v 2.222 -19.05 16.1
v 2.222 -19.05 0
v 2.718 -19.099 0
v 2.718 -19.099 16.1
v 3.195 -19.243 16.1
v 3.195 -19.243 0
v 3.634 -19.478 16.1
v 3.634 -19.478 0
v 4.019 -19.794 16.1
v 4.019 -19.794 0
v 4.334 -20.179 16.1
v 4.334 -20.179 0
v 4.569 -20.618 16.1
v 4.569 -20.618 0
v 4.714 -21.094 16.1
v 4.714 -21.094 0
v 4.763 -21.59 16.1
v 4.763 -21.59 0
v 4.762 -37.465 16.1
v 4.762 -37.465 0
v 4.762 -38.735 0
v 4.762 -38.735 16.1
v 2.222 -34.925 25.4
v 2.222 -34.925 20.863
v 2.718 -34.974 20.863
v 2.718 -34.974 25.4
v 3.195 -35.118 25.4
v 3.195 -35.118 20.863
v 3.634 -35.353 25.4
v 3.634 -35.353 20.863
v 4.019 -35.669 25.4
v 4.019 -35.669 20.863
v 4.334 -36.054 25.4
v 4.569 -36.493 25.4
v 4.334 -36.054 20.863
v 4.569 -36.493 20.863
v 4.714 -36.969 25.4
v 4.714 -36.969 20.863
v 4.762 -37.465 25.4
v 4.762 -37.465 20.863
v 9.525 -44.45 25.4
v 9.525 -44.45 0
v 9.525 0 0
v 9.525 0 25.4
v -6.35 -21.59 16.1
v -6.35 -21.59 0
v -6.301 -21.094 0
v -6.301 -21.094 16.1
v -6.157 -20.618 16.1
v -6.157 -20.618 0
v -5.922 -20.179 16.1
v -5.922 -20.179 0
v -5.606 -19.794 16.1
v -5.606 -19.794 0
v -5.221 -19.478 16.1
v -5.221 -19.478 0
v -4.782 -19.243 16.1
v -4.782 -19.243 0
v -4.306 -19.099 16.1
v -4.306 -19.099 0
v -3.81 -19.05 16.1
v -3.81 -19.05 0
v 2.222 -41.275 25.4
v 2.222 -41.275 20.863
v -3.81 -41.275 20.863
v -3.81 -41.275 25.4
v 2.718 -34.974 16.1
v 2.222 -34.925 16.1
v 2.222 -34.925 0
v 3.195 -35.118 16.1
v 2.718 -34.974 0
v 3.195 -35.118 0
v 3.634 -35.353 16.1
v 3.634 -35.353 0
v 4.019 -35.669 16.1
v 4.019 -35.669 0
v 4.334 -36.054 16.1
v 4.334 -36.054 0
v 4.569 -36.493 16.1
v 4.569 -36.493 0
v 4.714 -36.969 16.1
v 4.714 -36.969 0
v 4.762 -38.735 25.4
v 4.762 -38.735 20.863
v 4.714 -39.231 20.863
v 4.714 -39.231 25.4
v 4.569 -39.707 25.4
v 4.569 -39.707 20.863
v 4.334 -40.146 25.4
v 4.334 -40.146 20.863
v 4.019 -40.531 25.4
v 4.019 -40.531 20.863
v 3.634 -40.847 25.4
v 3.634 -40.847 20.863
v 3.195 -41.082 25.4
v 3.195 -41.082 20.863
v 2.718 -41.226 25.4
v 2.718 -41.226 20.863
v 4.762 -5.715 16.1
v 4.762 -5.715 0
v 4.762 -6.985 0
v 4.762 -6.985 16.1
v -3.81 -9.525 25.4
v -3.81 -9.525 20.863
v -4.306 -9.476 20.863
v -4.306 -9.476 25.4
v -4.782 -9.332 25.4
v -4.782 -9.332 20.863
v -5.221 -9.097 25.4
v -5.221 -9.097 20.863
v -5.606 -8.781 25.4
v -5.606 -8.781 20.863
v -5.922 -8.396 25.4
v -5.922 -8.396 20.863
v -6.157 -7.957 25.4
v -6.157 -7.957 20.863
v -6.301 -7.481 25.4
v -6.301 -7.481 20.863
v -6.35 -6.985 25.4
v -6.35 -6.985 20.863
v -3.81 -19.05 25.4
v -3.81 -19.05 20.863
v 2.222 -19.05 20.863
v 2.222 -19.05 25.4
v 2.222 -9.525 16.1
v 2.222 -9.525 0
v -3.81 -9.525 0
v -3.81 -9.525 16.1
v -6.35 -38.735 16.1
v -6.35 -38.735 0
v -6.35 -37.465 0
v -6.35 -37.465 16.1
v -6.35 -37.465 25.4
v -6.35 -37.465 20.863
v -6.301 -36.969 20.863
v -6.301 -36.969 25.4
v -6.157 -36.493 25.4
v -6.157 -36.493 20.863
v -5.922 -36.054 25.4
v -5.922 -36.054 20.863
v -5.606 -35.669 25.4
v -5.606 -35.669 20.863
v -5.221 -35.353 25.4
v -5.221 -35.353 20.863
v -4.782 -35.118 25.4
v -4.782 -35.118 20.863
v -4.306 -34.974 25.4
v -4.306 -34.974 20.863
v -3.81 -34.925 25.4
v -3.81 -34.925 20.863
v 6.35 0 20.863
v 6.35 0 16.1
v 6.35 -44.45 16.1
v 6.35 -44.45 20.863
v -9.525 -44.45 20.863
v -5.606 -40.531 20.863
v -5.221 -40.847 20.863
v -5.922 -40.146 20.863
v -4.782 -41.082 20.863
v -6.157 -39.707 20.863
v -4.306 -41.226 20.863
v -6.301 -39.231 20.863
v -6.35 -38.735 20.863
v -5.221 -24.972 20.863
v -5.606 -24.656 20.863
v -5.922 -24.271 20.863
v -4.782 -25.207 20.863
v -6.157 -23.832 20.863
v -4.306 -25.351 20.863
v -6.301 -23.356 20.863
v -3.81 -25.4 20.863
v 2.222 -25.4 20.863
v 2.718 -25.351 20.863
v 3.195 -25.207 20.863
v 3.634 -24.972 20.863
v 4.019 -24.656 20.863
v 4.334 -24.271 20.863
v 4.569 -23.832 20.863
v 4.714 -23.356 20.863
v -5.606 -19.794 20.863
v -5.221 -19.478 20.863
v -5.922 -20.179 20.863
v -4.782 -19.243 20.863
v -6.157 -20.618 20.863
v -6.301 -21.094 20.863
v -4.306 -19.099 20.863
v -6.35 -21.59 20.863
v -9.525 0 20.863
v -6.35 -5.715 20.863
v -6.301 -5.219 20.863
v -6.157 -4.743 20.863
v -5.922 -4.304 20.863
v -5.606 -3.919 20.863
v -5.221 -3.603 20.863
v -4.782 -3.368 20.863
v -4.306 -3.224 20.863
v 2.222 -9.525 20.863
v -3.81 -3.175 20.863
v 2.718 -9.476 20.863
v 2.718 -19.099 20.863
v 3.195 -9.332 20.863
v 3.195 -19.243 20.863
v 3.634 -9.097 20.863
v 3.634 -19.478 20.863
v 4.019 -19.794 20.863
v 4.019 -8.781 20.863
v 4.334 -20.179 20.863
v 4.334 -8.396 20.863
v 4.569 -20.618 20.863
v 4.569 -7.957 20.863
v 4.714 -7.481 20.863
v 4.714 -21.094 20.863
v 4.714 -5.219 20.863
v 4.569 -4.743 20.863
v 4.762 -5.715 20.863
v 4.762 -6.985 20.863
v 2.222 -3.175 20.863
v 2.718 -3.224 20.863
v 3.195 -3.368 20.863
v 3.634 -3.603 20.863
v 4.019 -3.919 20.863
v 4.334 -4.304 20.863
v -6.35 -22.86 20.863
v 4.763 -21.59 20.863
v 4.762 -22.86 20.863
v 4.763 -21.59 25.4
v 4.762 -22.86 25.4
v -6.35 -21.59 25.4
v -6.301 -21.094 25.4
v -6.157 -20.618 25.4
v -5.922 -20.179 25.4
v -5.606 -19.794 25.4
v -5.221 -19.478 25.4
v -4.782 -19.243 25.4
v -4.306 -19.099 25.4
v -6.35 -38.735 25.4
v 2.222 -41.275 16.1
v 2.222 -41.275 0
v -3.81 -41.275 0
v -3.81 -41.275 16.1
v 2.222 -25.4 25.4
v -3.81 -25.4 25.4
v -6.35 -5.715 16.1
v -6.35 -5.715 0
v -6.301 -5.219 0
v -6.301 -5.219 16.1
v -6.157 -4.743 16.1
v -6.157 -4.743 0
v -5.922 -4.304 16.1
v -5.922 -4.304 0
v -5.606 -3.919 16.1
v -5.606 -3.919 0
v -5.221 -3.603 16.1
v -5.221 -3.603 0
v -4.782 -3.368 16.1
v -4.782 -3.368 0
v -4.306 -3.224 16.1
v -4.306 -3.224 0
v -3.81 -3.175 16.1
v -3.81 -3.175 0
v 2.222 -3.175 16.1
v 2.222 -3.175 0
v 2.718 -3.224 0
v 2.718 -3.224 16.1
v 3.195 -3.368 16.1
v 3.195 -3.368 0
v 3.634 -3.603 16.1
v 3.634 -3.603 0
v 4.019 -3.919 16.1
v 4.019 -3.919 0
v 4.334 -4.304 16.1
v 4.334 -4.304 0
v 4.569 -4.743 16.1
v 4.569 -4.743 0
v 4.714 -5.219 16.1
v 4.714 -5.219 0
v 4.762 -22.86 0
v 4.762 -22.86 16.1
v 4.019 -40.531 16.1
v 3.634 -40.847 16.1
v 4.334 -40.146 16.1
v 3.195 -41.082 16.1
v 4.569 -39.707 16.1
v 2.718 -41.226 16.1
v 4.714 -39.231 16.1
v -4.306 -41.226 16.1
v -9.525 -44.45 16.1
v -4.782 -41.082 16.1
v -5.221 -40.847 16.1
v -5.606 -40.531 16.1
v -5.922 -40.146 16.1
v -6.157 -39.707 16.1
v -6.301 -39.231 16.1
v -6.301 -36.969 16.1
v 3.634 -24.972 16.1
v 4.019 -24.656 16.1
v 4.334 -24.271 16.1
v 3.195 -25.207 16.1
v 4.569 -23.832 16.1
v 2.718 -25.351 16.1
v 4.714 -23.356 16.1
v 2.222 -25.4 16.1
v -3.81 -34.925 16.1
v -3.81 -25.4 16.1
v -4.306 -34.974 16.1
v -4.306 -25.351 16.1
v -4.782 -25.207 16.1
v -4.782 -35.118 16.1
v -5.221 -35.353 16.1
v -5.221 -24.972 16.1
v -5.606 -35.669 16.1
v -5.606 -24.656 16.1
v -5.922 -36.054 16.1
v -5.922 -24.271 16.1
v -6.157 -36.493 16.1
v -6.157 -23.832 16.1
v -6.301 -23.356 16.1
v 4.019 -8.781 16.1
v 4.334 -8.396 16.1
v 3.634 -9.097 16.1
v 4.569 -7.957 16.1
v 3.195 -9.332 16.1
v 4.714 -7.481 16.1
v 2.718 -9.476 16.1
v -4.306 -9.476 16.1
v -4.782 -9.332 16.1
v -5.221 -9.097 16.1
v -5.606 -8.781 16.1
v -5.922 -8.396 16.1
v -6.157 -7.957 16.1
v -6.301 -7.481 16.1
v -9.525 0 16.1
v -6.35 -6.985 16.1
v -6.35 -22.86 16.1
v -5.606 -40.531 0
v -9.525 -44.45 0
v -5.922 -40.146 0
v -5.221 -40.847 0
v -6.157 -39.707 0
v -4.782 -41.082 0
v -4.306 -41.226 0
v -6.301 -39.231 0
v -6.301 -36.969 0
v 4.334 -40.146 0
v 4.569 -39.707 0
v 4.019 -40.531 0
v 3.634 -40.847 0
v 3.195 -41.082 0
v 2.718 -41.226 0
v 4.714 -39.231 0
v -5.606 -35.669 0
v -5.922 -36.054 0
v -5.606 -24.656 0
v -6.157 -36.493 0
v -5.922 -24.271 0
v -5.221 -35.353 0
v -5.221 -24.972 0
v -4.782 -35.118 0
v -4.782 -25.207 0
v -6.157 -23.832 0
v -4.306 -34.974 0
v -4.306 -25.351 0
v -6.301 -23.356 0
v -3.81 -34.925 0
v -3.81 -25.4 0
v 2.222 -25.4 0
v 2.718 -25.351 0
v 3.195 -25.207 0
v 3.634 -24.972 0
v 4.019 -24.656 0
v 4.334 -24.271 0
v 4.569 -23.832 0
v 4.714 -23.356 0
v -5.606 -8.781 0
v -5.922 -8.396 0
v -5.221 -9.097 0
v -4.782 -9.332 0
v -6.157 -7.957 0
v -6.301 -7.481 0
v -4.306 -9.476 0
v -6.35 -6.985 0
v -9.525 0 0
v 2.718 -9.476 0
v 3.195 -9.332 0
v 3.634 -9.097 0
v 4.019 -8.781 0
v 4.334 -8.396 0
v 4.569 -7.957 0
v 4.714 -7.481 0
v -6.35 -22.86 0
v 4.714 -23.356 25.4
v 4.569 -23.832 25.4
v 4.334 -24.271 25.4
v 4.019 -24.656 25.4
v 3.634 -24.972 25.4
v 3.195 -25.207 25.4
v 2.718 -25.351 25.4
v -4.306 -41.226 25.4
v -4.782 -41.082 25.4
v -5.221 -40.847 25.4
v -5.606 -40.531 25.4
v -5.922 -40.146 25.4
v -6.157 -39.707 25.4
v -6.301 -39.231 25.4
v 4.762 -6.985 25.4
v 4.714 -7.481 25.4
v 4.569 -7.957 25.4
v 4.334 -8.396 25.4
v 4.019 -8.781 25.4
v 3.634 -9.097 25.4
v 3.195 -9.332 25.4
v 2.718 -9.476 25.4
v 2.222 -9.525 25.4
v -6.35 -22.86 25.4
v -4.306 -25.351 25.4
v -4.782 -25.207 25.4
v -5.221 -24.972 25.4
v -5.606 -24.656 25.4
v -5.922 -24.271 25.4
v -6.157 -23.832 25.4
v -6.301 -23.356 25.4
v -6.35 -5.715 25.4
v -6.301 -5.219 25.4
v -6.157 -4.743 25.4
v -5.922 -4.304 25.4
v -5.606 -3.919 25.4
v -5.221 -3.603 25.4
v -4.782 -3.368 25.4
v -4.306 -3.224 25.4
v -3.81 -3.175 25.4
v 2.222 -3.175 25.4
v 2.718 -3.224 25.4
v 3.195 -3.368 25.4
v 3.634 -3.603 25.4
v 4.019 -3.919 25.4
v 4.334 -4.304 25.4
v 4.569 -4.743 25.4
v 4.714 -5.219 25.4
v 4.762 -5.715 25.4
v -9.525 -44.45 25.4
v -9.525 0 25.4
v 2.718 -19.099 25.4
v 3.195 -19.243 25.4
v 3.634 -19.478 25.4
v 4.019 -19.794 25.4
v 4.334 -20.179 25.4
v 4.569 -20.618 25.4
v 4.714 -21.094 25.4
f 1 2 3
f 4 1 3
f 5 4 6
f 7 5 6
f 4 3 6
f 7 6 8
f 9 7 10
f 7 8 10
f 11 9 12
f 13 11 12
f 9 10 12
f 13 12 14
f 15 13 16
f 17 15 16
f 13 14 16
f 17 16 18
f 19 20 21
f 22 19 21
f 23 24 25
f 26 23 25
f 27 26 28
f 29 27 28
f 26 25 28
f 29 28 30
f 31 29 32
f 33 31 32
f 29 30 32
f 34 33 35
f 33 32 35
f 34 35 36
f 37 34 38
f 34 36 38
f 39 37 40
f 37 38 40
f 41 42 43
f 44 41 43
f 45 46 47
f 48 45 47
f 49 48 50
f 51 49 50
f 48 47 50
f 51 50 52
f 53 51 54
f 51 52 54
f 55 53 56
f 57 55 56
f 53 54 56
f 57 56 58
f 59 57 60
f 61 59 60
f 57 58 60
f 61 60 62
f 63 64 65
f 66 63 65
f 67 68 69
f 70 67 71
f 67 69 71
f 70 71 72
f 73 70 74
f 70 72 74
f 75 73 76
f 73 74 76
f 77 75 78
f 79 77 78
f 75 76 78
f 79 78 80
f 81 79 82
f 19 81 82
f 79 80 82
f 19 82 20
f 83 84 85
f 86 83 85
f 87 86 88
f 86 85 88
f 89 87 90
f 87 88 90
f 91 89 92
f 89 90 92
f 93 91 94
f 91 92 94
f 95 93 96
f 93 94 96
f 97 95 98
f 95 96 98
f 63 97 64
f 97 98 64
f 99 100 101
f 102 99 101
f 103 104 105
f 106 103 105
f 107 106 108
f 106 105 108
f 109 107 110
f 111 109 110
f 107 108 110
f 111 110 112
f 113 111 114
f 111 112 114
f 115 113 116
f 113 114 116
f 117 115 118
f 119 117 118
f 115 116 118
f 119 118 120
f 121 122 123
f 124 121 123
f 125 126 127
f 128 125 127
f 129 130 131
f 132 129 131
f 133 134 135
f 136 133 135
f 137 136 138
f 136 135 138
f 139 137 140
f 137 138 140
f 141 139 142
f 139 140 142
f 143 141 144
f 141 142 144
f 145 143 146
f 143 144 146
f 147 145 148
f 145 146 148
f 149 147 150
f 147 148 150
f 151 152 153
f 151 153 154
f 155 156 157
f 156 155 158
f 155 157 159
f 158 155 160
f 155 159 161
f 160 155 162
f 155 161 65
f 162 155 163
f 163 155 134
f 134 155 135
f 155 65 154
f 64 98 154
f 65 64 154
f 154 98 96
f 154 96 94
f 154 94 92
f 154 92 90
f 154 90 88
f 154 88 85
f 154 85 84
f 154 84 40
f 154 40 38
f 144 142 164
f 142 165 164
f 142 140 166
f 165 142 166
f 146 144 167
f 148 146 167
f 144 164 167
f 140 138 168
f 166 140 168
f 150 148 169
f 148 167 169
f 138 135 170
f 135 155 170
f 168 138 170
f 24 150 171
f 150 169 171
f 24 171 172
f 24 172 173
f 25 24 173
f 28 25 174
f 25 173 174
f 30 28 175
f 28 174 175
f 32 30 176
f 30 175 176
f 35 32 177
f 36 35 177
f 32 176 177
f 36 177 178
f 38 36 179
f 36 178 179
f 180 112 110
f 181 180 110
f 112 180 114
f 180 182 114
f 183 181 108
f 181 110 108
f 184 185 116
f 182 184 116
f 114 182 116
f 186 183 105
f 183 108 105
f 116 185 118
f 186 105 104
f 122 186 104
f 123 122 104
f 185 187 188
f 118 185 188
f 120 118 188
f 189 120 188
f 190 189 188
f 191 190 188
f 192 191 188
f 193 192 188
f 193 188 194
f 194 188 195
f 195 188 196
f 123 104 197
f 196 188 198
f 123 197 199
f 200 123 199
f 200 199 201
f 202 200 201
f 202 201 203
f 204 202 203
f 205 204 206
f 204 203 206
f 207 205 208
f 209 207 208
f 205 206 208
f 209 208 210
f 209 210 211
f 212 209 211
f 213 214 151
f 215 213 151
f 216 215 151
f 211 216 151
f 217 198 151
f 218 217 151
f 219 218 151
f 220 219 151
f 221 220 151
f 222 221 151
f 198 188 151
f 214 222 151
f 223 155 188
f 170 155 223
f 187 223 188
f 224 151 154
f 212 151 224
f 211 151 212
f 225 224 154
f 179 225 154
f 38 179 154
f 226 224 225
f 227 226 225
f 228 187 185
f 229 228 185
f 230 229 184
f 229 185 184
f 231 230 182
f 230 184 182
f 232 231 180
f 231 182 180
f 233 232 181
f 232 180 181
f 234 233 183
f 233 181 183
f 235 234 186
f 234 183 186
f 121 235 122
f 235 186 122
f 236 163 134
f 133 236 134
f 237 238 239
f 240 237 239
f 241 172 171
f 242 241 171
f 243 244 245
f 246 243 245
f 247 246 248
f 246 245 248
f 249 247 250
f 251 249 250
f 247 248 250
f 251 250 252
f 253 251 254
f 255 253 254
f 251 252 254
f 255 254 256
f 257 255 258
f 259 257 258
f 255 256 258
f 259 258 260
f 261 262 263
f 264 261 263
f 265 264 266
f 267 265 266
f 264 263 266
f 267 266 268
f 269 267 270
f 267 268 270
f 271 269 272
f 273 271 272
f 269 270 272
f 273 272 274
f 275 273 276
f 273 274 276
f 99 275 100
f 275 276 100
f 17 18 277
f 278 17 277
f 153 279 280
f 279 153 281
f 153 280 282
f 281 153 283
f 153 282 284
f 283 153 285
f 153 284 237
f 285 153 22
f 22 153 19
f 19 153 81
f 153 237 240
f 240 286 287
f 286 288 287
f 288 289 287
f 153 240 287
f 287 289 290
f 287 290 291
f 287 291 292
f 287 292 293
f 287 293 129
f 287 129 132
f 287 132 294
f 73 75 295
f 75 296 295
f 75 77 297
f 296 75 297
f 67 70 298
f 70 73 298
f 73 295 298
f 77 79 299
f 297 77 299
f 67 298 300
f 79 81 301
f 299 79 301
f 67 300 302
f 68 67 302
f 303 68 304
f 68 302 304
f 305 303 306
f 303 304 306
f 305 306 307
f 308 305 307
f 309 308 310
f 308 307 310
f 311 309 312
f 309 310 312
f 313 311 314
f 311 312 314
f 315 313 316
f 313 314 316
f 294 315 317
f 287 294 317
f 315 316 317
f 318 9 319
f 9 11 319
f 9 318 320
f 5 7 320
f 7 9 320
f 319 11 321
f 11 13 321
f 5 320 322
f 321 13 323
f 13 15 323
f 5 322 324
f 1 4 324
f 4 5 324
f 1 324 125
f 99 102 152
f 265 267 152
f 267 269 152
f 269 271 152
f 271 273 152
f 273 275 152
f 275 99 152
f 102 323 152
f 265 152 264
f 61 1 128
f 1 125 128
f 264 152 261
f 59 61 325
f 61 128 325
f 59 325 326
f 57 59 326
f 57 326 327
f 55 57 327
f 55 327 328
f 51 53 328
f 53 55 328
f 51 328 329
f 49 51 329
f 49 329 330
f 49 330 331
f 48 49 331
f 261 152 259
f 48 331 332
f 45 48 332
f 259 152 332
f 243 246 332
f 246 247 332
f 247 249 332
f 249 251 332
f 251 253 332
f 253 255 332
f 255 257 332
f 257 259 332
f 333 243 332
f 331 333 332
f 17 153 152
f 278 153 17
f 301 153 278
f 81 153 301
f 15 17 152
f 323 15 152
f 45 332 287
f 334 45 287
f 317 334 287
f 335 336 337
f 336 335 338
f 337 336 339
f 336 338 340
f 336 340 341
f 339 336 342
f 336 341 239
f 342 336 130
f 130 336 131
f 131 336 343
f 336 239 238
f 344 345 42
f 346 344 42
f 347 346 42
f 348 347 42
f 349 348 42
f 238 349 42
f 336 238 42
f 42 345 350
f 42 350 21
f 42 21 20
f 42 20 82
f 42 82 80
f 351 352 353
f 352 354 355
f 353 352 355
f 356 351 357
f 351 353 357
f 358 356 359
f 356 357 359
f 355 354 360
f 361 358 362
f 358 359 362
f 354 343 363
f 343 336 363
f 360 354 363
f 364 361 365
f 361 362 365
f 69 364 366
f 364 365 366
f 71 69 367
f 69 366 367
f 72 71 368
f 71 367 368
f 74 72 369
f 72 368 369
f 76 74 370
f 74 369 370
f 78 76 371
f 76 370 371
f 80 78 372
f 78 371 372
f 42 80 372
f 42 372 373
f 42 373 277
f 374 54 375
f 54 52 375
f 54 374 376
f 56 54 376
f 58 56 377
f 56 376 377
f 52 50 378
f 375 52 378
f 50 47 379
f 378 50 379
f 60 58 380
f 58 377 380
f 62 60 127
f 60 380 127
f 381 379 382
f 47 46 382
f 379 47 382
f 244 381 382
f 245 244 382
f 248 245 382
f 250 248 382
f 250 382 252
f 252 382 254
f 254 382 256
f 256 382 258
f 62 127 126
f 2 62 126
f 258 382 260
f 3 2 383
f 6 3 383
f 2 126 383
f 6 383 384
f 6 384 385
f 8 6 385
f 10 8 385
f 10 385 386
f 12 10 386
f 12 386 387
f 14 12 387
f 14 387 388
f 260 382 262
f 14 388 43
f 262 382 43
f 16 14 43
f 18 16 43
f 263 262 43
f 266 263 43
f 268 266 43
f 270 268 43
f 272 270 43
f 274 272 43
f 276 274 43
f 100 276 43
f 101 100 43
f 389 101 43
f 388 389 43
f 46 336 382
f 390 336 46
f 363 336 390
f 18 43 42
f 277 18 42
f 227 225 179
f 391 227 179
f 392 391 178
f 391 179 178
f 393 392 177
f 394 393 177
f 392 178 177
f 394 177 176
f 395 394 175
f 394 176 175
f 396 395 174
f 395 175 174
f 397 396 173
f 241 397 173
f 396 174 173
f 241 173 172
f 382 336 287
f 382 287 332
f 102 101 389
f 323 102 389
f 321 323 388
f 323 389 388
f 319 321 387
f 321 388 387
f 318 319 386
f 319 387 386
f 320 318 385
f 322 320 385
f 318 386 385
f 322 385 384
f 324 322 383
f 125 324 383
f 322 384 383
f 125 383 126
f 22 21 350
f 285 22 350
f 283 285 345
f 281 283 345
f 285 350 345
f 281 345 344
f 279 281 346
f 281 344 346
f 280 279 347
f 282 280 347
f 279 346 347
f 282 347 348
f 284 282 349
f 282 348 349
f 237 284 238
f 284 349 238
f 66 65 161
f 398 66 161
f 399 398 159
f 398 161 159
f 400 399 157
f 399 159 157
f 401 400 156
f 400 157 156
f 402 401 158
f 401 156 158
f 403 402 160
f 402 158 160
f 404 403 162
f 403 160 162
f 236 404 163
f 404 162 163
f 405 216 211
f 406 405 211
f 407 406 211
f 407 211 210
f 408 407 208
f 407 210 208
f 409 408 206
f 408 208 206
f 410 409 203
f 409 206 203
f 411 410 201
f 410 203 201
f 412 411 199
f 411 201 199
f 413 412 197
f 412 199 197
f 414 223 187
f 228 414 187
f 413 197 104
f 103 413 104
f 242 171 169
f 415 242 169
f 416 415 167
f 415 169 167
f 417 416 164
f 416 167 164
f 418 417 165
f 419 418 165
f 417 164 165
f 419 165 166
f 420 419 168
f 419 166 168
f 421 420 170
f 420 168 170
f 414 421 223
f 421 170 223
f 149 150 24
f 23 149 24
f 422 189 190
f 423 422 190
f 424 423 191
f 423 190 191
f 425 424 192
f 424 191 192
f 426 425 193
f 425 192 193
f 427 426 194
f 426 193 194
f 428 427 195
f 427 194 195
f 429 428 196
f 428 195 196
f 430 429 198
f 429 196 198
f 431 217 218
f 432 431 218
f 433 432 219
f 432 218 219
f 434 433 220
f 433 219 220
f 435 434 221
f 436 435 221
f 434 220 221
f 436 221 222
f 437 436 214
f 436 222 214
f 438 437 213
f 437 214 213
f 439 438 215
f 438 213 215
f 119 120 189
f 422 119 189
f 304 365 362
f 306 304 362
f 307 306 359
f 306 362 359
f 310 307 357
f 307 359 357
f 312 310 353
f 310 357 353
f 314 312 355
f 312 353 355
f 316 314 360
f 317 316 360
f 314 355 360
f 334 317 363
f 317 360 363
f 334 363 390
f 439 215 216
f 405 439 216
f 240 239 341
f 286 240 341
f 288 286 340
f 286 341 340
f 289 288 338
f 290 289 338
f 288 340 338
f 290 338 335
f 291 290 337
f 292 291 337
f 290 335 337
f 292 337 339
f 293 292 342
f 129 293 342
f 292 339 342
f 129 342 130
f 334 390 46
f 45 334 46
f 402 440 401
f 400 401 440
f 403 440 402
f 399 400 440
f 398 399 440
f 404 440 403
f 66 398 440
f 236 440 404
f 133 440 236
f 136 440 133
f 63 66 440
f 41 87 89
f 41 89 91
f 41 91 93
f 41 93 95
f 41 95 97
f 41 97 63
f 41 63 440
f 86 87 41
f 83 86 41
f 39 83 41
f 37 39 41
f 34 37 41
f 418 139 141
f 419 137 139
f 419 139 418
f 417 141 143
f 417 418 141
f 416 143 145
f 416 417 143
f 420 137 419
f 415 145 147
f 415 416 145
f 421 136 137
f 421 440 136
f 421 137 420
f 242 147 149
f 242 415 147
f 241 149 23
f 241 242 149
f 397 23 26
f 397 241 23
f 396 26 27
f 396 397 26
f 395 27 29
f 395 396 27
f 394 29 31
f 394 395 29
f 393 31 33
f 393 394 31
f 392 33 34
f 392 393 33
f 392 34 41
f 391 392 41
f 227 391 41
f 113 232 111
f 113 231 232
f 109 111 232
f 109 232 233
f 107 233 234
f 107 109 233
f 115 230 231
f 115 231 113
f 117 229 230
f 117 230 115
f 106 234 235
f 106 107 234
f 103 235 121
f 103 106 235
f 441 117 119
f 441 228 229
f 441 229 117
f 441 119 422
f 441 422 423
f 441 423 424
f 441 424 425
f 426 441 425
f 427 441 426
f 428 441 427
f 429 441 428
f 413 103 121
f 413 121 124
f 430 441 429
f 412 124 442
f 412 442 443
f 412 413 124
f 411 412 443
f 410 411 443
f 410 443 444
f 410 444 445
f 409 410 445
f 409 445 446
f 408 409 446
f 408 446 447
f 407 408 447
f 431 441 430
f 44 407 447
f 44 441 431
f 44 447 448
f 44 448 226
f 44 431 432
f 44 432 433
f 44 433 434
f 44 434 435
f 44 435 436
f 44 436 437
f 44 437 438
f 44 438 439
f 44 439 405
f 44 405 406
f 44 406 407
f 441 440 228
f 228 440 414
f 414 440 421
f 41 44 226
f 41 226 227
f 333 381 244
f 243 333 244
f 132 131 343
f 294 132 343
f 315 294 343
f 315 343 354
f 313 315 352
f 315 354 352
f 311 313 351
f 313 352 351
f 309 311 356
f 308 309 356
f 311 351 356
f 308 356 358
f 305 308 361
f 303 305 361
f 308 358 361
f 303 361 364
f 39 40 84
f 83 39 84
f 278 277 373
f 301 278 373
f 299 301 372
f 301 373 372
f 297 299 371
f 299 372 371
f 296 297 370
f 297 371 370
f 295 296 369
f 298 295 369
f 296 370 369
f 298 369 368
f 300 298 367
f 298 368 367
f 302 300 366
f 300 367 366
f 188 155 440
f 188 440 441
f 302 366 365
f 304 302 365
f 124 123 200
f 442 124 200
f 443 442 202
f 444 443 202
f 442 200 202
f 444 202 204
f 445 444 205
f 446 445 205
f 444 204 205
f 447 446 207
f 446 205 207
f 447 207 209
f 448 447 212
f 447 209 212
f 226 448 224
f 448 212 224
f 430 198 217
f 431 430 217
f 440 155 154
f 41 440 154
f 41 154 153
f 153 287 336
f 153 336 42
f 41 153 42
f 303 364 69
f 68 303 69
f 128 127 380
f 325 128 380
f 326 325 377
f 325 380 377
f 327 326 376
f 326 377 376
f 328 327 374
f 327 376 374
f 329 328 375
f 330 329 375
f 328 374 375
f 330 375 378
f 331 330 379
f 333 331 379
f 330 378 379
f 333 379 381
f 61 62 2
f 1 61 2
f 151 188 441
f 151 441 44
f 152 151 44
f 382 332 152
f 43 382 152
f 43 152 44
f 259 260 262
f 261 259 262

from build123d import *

# Parameters (mm, degrees)
F0_W     = 19.05
F0_H     = 44.45
F1_DEPTH = 25.4
F2_W     = 15.875
F2_H     = 4.7625
F2_W_2   = 9.525
F3_DEPTH = 45.974


with BuildPart() as f1:
    # F0 (on Top) → F1 (new body)
    with BuildSketch(Plane.XY):
        with Locations((0, -22.225)):
            Rectangle(F0_W, F0_H)
        with BuildLine():
            ThreePointArc((-6.35, -37.465), (-5.606051, -35.668949), (-3.81, -34.925))
            Line((-3.81, -34.925), (2.2225, -34.925))
            ThreePointArc((2.2225, -34.925), (4.018551, -35.668949), (4.7625, -37.465))
            Line((4.7625, -37.465), (4.7625, -38.735))
            ThreePointArc((4.7625, -38.735), (4.018551, -40.531051), (2.2225, -41.275))
            Line((2.2225, -41.275), (-3.81, -41.275))
            ThreePointArc((-3.81, -41.275), (-5.606051, -40.531051), (-6.35, -38.735))
            Line((-6.35, -38.735), (-6.35, -37.465))
        make_face(mode=Mode.SUBTRACT)
        with BuildLine():
            ThreePointArc((-6.35, -21.59), (-5.606051, -19.793949), (-3.81, -19.05))
            Line((-3.81, -19.05), (2.2225, -19.05))
            ThreePointArc((2.2225, -19.05), (4.018551, -19.793949), (4.7625, -21.59))
            Line((4.7625, -21.59), (4.7625, -22.86))
            ThreePointArc((4.7625, -22.86), (4.018551, -24.656051), (2.2225, -25.4))
            Line((2.2225, -25.4), (-3.81, -25.4))
            ThreePointArc((-3.81, -25.4), (-5.606051, -24.656051), (-6.35, -22.86))
            Line((-6.35, -22.86), (-6.35, -21.59))
        make_face(mode=Mode.SUBTRACT)
        with BuildLine():
            ThreePointArc((-6.35, -5.715), (-5.606051, -3.918949), (-3.81, -3.175))
            Line((-3.81, -3.175), (2.2225, -3.175))
            ThreePointArc((2.2225, -3.175), (4.018551, -3.918949), (4.7625, -5.715))
            Line((4.7625, -5.715), (4.7625, -6.985))
            ThreePointArc((4.7625, -6.985), (4.018551, -8.781051), (2.2225, -9.525))
            Line((2.2225, -9.525), (-3.81, -9.525))
            ThreePointArc((-3.81, -9.525), (-5.606051, -8.781051), (-6.35, -6.985))
            Line((-6.35, -6.985), (-6.35, -5.715))
        make_face(mode=Mode.SUBTRACT)
    extrude(amount=F1_DEPTH)

    # F2 (on face) → F3 (cut)
    with BuildSketch(Plane(origin=(0, 0, 0), x_dir=(-1, 0, 0), z_dir=(0, 1, 0))):
        with Locations((1.5875, 18.481419)):
            Rectangle(F2_W, F2_H)
        with Locations((14.2875, 18.481419)):
            Rectangle(F2_W_2, F2_H)
    extrude(amount=-F3_DEPTH, mode=Mode.SUBTRACT)


solid = f1.part
